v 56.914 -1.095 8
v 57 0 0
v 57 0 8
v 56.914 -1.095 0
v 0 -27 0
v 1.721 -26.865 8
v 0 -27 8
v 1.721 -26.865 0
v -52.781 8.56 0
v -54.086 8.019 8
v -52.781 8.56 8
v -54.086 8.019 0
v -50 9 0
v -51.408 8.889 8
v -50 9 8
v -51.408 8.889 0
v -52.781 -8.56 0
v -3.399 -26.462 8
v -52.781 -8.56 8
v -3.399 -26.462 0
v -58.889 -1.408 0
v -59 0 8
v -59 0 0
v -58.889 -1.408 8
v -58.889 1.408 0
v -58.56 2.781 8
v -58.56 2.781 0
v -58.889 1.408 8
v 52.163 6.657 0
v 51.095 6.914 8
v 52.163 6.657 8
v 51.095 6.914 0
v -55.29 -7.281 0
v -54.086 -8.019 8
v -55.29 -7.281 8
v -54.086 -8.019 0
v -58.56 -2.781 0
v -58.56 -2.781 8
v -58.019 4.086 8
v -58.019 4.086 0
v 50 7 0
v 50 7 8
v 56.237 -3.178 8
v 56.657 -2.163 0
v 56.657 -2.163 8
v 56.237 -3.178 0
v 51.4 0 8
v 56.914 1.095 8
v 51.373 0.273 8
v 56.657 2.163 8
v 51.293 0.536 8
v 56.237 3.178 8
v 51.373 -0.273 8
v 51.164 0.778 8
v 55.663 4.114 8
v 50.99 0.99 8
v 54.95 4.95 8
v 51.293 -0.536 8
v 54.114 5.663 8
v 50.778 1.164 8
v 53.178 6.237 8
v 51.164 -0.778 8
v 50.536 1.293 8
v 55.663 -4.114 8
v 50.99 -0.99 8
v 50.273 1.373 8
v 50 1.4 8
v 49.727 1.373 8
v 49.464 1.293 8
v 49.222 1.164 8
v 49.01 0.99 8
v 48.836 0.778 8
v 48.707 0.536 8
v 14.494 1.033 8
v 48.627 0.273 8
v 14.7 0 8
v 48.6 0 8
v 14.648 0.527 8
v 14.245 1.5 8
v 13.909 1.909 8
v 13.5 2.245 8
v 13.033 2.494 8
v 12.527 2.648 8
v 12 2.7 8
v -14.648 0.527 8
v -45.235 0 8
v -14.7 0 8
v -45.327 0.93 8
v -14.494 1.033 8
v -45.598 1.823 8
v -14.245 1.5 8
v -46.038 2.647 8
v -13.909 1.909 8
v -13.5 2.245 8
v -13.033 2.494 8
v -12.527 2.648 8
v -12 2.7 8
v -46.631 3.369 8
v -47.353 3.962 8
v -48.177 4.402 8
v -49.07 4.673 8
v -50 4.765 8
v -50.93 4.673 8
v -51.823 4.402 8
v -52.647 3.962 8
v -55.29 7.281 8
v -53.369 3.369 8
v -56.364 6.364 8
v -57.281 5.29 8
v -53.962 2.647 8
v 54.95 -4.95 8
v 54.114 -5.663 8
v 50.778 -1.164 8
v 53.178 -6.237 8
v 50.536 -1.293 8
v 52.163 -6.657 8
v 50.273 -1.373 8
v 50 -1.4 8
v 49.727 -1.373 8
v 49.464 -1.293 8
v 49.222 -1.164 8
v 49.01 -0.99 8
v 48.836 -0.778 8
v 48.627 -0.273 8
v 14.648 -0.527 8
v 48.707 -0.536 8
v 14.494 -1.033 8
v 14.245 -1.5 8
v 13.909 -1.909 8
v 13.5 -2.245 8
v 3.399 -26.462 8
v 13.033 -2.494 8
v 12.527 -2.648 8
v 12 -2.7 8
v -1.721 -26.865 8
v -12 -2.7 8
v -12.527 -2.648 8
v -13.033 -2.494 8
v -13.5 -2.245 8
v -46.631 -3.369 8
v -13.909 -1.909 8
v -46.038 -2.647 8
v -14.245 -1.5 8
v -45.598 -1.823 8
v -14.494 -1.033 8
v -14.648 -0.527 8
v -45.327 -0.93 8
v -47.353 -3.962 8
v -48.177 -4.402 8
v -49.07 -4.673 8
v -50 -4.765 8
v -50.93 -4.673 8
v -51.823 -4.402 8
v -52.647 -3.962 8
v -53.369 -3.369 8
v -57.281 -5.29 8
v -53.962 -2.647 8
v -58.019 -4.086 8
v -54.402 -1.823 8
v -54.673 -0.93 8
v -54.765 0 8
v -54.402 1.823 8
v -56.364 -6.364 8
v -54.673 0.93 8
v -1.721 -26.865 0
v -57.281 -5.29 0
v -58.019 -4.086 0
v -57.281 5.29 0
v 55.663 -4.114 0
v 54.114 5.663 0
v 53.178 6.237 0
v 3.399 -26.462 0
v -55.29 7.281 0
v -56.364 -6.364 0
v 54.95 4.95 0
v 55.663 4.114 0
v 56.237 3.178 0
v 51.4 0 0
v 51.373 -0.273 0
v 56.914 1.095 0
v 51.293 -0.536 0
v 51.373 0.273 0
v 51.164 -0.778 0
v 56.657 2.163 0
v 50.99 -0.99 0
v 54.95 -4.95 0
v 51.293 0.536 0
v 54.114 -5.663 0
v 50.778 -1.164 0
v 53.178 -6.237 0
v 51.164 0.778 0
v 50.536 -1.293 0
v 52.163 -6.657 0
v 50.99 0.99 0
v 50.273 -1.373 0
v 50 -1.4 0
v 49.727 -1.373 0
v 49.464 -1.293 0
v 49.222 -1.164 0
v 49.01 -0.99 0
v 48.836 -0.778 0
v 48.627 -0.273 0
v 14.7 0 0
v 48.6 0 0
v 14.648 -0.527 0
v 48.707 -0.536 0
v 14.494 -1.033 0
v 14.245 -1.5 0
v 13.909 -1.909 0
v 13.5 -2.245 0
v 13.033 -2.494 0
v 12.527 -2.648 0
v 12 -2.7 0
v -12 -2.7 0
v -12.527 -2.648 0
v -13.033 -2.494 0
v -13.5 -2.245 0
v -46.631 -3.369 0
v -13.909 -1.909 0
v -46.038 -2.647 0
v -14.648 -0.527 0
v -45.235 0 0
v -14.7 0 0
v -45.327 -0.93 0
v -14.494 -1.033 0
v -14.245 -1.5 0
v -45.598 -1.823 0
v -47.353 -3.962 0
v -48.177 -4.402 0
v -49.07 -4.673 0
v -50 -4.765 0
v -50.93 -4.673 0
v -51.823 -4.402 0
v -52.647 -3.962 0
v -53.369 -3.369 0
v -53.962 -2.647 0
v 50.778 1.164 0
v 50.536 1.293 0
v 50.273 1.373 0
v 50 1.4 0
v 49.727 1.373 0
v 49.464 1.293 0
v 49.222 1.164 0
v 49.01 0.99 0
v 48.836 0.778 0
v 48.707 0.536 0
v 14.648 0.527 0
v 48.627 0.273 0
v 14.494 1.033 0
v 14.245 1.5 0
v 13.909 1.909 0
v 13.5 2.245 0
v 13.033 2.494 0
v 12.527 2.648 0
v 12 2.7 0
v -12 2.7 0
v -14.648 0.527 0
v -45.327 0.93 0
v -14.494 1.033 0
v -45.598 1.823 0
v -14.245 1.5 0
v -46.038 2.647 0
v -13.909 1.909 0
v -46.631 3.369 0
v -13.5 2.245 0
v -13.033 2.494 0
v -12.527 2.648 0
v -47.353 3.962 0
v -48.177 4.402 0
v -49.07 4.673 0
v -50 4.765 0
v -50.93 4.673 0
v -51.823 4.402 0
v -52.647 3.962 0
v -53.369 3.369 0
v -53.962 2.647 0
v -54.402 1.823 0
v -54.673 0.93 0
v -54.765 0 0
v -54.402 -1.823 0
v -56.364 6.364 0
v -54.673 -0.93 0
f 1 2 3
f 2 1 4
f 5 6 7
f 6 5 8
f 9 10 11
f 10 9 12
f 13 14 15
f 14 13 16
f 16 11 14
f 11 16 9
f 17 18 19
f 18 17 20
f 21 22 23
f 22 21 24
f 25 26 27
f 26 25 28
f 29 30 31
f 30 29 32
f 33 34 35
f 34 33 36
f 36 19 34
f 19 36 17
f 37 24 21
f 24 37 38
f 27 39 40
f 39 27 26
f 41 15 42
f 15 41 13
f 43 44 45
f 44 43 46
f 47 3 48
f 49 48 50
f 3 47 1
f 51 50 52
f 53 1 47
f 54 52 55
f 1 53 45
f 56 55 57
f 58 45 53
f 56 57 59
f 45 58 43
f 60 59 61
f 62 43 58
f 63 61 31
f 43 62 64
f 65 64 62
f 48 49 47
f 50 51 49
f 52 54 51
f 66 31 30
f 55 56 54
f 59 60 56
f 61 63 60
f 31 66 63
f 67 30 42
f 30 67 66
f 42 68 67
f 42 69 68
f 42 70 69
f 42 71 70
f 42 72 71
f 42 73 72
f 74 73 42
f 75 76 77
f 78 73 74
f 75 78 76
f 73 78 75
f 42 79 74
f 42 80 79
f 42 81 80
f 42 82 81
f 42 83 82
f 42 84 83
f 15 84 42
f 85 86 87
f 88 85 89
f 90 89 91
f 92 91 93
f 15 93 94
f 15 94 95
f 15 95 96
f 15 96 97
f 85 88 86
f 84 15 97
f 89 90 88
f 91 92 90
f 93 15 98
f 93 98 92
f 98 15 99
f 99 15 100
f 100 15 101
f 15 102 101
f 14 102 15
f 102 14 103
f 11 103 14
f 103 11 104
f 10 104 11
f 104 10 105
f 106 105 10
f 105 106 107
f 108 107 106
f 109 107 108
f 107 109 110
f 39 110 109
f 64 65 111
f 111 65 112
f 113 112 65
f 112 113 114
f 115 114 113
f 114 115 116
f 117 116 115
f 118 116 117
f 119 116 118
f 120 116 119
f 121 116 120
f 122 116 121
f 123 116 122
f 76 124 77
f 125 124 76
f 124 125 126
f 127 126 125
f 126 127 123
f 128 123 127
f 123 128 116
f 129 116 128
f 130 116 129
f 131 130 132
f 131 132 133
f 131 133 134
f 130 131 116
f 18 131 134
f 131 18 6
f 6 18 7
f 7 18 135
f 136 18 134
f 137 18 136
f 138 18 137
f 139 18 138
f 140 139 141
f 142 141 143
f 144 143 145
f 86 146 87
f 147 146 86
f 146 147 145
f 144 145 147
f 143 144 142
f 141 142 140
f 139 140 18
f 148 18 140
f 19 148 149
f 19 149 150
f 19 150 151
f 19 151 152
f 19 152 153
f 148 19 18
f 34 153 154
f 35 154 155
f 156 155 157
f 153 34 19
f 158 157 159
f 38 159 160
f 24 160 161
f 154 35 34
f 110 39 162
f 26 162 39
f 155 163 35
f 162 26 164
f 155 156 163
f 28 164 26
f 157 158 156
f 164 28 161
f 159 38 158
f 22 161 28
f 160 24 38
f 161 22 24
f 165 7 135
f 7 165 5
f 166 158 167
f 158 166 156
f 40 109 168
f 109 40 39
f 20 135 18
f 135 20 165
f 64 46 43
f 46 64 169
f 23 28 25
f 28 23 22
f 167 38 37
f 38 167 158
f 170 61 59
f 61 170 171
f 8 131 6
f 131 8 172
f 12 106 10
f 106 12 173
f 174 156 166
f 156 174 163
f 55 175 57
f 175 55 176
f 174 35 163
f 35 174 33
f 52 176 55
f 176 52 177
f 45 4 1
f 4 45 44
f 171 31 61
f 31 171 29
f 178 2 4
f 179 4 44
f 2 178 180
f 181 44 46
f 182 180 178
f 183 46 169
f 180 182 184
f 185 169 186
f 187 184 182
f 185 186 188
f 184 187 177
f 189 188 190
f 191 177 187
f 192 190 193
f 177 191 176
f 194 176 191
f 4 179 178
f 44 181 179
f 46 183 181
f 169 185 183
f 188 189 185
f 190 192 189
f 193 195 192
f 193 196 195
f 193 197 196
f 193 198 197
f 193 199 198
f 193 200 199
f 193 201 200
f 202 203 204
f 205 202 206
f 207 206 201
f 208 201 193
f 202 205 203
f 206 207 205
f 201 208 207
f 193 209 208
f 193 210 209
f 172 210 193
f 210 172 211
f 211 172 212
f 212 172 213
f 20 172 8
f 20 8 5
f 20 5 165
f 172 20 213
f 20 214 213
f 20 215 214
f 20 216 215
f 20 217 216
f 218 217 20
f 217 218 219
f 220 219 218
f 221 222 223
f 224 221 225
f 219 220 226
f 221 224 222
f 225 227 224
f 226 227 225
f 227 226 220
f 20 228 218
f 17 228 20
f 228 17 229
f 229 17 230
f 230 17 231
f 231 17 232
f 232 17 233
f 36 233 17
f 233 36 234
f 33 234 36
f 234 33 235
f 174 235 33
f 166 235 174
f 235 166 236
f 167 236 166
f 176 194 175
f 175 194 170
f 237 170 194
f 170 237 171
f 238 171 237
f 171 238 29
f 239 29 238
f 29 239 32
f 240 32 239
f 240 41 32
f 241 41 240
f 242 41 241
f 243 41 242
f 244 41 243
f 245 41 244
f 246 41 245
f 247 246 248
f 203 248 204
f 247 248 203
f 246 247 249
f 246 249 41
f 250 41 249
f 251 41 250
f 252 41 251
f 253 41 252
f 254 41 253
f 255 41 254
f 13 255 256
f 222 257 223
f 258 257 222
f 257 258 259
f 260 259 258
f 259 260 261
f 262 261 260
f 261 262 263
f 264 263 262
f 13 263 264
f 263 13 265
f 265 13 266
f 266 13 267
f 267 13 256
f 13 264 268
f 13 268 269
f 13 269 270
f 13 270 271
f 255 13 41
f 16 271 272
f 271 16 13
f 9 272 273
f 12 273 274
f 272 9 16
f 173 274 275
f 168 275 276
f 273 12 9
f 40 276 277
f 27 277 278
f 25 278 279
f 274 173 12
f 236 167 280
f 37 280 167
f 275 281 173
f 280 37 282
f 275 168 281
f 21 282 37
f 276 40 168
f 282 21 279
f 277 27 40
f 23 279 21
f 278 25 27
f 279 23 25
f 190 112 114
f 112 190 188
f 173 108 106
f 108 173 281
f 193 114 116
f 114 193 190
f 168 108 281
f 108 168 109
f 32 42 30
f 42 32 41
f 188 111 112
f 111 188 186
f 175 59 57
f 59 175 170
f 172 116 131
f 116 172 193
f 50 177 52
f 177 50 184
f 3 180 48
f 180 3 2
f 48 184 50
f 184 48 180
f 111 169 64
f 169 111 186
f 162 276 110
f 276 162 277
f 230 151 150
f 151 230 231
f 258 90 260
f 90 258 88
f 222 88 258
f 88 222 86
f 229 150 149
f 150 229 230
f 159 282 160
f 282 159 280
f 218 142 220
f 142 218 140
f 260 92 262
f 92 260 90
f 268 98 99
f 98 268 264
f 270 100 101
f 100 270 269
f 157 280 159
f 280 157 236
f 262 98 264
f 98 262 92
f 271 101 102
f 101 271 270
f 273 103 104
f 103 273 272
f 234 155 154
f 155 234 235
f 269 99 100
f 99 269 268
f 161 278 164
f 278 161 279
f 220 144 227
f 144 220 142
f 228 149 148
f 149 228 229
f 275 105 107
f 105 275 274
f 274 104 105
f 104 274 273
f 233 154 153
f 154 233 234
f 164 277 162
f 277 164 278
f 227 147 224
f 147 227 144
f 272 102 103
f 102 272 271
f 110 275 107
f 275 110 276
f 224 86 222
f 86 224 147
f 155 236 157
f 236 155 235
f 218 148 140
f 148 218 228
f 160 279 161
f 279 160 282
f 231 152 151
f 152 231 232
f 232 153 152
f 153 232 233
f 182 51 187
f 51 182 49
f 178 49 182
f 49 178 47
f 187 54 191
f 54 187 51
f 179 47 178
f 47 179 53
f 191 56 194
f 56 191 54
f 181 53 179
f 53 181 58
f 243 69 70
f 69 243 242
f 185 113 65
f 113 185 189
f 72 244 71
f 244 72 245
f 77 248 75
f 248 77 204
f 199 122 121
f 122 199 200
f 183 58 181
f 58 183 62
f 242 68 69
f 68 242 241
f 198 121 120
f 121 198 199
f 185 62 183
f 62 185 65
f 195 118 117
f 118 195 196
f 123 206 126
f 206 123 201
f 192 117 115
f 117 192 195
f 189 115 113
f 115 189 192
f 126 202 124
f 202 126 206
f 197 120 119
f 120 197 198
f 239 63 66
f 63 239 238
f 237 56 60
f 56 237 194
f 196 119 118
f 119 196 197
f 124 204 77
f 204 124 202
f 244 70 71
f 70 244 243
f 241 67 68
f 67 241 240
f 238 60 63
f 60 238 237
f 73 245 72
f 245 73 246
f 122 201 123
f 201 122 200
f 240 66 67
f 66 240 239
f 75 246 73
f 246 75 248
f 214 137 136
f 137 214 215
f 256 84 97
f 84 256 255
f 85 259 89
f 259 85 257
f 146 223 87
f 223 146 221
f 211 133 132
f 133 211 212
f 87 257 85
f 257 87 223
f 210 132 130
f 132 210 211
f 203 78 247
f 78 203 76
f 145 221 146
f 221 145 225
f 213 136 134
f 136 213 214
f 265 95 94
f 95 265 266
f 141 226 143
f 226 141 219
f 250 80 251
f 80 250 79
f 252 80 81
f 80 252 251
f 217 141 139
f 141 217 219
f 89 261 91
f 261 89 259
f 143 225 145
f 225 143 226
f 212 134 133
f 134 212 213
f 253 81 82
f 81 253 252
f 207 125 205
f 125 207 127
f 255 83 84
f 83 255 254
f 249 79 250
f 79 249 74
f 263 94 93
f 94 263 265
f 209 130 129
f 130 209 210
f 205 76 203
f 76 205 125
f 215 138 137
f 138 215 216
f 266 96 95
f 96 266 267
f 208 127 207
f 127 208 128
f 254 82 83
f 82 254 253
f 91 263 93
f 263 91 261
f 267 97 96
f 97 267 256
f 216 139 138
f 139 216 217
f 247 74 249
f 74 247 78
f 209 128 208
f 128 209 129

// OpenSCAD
$fn = 32;

// ----------------------------------------------------------------------
// Lever: 100 mm between the bosses, 8 mm thick, smooth outline
// ----------------------------------------------------------------------

// --- parameters (mm) ---
lever_l = 100;            // distance between the boss centres
boss_a = 18;              // first boss diameter
boss_b = 14;              // second boss diameter
bore_a = 9.53;            // first bore
bore_b = 2.8;             // second bore
lever_t = 8;              // lever thickness
boss_c = 22;              // middle boss diameter
bend = 16;                // how far the middle boss drops
slot_w = 5.4;             // adjustment slot width

lever_profile = [[-59, 0], [-58.889, -1.408], [-58.56, -2.781], [-58.019, -4.086], [-57.281, -5.29], [-56.364, -6.364], [-55.29, -7.281], [-54.086, -8.019], [-52.781, -8.56], [-3.399, -26.462], [-1.721, -26.865], [0, -27], [1.721, -26.865], [3.399, -26.462], [52.163, -6.657], [53.178, -6.237], [54.114, -5.663], [54.95, -4.95], [55.663, -4.114], [56.237, -3.178], [56.657, -2.163], [56.914, -1.095], [57, 0], [56.914, 1.095], [56.657, 2.163], [56.237, 3.178], [55.663, 4.114], [54.95, 4.95], [54.114, 5.663], [53.178, 6.237], [52.163, 6.657], [51.095, 6.914], [50, 7], [-50, 9], [-51.408, 8.889], [-52.781, 8.56], [-54.086, 8.019], [-55.29, 7.281], [-56.364, 6.364], [-57.281, 5.29], [-58.019, 4.086], [-58.56, 2.781], [-58.889, 1.408]];

difference() {
  linear_extrude(height = lever_t) polygon(lever_profile);
  translate([-50, 0, -2.5]) cylinder(h = lever_t + 5, d = bore_a);
  translate([50, 0, -2.5]) cylinder(h = lever_t + 5, d = bore_b);
  /* slotted adjustment, stadium shaped */
  hull() {
    translate([-12, 0, -2.5]) cylinder(h = lever_t + 5, d = slot_w);
    translate([12, 0, -2.5]) cylinder(h = lever_t + 5, d = slot_w);
  }
}
